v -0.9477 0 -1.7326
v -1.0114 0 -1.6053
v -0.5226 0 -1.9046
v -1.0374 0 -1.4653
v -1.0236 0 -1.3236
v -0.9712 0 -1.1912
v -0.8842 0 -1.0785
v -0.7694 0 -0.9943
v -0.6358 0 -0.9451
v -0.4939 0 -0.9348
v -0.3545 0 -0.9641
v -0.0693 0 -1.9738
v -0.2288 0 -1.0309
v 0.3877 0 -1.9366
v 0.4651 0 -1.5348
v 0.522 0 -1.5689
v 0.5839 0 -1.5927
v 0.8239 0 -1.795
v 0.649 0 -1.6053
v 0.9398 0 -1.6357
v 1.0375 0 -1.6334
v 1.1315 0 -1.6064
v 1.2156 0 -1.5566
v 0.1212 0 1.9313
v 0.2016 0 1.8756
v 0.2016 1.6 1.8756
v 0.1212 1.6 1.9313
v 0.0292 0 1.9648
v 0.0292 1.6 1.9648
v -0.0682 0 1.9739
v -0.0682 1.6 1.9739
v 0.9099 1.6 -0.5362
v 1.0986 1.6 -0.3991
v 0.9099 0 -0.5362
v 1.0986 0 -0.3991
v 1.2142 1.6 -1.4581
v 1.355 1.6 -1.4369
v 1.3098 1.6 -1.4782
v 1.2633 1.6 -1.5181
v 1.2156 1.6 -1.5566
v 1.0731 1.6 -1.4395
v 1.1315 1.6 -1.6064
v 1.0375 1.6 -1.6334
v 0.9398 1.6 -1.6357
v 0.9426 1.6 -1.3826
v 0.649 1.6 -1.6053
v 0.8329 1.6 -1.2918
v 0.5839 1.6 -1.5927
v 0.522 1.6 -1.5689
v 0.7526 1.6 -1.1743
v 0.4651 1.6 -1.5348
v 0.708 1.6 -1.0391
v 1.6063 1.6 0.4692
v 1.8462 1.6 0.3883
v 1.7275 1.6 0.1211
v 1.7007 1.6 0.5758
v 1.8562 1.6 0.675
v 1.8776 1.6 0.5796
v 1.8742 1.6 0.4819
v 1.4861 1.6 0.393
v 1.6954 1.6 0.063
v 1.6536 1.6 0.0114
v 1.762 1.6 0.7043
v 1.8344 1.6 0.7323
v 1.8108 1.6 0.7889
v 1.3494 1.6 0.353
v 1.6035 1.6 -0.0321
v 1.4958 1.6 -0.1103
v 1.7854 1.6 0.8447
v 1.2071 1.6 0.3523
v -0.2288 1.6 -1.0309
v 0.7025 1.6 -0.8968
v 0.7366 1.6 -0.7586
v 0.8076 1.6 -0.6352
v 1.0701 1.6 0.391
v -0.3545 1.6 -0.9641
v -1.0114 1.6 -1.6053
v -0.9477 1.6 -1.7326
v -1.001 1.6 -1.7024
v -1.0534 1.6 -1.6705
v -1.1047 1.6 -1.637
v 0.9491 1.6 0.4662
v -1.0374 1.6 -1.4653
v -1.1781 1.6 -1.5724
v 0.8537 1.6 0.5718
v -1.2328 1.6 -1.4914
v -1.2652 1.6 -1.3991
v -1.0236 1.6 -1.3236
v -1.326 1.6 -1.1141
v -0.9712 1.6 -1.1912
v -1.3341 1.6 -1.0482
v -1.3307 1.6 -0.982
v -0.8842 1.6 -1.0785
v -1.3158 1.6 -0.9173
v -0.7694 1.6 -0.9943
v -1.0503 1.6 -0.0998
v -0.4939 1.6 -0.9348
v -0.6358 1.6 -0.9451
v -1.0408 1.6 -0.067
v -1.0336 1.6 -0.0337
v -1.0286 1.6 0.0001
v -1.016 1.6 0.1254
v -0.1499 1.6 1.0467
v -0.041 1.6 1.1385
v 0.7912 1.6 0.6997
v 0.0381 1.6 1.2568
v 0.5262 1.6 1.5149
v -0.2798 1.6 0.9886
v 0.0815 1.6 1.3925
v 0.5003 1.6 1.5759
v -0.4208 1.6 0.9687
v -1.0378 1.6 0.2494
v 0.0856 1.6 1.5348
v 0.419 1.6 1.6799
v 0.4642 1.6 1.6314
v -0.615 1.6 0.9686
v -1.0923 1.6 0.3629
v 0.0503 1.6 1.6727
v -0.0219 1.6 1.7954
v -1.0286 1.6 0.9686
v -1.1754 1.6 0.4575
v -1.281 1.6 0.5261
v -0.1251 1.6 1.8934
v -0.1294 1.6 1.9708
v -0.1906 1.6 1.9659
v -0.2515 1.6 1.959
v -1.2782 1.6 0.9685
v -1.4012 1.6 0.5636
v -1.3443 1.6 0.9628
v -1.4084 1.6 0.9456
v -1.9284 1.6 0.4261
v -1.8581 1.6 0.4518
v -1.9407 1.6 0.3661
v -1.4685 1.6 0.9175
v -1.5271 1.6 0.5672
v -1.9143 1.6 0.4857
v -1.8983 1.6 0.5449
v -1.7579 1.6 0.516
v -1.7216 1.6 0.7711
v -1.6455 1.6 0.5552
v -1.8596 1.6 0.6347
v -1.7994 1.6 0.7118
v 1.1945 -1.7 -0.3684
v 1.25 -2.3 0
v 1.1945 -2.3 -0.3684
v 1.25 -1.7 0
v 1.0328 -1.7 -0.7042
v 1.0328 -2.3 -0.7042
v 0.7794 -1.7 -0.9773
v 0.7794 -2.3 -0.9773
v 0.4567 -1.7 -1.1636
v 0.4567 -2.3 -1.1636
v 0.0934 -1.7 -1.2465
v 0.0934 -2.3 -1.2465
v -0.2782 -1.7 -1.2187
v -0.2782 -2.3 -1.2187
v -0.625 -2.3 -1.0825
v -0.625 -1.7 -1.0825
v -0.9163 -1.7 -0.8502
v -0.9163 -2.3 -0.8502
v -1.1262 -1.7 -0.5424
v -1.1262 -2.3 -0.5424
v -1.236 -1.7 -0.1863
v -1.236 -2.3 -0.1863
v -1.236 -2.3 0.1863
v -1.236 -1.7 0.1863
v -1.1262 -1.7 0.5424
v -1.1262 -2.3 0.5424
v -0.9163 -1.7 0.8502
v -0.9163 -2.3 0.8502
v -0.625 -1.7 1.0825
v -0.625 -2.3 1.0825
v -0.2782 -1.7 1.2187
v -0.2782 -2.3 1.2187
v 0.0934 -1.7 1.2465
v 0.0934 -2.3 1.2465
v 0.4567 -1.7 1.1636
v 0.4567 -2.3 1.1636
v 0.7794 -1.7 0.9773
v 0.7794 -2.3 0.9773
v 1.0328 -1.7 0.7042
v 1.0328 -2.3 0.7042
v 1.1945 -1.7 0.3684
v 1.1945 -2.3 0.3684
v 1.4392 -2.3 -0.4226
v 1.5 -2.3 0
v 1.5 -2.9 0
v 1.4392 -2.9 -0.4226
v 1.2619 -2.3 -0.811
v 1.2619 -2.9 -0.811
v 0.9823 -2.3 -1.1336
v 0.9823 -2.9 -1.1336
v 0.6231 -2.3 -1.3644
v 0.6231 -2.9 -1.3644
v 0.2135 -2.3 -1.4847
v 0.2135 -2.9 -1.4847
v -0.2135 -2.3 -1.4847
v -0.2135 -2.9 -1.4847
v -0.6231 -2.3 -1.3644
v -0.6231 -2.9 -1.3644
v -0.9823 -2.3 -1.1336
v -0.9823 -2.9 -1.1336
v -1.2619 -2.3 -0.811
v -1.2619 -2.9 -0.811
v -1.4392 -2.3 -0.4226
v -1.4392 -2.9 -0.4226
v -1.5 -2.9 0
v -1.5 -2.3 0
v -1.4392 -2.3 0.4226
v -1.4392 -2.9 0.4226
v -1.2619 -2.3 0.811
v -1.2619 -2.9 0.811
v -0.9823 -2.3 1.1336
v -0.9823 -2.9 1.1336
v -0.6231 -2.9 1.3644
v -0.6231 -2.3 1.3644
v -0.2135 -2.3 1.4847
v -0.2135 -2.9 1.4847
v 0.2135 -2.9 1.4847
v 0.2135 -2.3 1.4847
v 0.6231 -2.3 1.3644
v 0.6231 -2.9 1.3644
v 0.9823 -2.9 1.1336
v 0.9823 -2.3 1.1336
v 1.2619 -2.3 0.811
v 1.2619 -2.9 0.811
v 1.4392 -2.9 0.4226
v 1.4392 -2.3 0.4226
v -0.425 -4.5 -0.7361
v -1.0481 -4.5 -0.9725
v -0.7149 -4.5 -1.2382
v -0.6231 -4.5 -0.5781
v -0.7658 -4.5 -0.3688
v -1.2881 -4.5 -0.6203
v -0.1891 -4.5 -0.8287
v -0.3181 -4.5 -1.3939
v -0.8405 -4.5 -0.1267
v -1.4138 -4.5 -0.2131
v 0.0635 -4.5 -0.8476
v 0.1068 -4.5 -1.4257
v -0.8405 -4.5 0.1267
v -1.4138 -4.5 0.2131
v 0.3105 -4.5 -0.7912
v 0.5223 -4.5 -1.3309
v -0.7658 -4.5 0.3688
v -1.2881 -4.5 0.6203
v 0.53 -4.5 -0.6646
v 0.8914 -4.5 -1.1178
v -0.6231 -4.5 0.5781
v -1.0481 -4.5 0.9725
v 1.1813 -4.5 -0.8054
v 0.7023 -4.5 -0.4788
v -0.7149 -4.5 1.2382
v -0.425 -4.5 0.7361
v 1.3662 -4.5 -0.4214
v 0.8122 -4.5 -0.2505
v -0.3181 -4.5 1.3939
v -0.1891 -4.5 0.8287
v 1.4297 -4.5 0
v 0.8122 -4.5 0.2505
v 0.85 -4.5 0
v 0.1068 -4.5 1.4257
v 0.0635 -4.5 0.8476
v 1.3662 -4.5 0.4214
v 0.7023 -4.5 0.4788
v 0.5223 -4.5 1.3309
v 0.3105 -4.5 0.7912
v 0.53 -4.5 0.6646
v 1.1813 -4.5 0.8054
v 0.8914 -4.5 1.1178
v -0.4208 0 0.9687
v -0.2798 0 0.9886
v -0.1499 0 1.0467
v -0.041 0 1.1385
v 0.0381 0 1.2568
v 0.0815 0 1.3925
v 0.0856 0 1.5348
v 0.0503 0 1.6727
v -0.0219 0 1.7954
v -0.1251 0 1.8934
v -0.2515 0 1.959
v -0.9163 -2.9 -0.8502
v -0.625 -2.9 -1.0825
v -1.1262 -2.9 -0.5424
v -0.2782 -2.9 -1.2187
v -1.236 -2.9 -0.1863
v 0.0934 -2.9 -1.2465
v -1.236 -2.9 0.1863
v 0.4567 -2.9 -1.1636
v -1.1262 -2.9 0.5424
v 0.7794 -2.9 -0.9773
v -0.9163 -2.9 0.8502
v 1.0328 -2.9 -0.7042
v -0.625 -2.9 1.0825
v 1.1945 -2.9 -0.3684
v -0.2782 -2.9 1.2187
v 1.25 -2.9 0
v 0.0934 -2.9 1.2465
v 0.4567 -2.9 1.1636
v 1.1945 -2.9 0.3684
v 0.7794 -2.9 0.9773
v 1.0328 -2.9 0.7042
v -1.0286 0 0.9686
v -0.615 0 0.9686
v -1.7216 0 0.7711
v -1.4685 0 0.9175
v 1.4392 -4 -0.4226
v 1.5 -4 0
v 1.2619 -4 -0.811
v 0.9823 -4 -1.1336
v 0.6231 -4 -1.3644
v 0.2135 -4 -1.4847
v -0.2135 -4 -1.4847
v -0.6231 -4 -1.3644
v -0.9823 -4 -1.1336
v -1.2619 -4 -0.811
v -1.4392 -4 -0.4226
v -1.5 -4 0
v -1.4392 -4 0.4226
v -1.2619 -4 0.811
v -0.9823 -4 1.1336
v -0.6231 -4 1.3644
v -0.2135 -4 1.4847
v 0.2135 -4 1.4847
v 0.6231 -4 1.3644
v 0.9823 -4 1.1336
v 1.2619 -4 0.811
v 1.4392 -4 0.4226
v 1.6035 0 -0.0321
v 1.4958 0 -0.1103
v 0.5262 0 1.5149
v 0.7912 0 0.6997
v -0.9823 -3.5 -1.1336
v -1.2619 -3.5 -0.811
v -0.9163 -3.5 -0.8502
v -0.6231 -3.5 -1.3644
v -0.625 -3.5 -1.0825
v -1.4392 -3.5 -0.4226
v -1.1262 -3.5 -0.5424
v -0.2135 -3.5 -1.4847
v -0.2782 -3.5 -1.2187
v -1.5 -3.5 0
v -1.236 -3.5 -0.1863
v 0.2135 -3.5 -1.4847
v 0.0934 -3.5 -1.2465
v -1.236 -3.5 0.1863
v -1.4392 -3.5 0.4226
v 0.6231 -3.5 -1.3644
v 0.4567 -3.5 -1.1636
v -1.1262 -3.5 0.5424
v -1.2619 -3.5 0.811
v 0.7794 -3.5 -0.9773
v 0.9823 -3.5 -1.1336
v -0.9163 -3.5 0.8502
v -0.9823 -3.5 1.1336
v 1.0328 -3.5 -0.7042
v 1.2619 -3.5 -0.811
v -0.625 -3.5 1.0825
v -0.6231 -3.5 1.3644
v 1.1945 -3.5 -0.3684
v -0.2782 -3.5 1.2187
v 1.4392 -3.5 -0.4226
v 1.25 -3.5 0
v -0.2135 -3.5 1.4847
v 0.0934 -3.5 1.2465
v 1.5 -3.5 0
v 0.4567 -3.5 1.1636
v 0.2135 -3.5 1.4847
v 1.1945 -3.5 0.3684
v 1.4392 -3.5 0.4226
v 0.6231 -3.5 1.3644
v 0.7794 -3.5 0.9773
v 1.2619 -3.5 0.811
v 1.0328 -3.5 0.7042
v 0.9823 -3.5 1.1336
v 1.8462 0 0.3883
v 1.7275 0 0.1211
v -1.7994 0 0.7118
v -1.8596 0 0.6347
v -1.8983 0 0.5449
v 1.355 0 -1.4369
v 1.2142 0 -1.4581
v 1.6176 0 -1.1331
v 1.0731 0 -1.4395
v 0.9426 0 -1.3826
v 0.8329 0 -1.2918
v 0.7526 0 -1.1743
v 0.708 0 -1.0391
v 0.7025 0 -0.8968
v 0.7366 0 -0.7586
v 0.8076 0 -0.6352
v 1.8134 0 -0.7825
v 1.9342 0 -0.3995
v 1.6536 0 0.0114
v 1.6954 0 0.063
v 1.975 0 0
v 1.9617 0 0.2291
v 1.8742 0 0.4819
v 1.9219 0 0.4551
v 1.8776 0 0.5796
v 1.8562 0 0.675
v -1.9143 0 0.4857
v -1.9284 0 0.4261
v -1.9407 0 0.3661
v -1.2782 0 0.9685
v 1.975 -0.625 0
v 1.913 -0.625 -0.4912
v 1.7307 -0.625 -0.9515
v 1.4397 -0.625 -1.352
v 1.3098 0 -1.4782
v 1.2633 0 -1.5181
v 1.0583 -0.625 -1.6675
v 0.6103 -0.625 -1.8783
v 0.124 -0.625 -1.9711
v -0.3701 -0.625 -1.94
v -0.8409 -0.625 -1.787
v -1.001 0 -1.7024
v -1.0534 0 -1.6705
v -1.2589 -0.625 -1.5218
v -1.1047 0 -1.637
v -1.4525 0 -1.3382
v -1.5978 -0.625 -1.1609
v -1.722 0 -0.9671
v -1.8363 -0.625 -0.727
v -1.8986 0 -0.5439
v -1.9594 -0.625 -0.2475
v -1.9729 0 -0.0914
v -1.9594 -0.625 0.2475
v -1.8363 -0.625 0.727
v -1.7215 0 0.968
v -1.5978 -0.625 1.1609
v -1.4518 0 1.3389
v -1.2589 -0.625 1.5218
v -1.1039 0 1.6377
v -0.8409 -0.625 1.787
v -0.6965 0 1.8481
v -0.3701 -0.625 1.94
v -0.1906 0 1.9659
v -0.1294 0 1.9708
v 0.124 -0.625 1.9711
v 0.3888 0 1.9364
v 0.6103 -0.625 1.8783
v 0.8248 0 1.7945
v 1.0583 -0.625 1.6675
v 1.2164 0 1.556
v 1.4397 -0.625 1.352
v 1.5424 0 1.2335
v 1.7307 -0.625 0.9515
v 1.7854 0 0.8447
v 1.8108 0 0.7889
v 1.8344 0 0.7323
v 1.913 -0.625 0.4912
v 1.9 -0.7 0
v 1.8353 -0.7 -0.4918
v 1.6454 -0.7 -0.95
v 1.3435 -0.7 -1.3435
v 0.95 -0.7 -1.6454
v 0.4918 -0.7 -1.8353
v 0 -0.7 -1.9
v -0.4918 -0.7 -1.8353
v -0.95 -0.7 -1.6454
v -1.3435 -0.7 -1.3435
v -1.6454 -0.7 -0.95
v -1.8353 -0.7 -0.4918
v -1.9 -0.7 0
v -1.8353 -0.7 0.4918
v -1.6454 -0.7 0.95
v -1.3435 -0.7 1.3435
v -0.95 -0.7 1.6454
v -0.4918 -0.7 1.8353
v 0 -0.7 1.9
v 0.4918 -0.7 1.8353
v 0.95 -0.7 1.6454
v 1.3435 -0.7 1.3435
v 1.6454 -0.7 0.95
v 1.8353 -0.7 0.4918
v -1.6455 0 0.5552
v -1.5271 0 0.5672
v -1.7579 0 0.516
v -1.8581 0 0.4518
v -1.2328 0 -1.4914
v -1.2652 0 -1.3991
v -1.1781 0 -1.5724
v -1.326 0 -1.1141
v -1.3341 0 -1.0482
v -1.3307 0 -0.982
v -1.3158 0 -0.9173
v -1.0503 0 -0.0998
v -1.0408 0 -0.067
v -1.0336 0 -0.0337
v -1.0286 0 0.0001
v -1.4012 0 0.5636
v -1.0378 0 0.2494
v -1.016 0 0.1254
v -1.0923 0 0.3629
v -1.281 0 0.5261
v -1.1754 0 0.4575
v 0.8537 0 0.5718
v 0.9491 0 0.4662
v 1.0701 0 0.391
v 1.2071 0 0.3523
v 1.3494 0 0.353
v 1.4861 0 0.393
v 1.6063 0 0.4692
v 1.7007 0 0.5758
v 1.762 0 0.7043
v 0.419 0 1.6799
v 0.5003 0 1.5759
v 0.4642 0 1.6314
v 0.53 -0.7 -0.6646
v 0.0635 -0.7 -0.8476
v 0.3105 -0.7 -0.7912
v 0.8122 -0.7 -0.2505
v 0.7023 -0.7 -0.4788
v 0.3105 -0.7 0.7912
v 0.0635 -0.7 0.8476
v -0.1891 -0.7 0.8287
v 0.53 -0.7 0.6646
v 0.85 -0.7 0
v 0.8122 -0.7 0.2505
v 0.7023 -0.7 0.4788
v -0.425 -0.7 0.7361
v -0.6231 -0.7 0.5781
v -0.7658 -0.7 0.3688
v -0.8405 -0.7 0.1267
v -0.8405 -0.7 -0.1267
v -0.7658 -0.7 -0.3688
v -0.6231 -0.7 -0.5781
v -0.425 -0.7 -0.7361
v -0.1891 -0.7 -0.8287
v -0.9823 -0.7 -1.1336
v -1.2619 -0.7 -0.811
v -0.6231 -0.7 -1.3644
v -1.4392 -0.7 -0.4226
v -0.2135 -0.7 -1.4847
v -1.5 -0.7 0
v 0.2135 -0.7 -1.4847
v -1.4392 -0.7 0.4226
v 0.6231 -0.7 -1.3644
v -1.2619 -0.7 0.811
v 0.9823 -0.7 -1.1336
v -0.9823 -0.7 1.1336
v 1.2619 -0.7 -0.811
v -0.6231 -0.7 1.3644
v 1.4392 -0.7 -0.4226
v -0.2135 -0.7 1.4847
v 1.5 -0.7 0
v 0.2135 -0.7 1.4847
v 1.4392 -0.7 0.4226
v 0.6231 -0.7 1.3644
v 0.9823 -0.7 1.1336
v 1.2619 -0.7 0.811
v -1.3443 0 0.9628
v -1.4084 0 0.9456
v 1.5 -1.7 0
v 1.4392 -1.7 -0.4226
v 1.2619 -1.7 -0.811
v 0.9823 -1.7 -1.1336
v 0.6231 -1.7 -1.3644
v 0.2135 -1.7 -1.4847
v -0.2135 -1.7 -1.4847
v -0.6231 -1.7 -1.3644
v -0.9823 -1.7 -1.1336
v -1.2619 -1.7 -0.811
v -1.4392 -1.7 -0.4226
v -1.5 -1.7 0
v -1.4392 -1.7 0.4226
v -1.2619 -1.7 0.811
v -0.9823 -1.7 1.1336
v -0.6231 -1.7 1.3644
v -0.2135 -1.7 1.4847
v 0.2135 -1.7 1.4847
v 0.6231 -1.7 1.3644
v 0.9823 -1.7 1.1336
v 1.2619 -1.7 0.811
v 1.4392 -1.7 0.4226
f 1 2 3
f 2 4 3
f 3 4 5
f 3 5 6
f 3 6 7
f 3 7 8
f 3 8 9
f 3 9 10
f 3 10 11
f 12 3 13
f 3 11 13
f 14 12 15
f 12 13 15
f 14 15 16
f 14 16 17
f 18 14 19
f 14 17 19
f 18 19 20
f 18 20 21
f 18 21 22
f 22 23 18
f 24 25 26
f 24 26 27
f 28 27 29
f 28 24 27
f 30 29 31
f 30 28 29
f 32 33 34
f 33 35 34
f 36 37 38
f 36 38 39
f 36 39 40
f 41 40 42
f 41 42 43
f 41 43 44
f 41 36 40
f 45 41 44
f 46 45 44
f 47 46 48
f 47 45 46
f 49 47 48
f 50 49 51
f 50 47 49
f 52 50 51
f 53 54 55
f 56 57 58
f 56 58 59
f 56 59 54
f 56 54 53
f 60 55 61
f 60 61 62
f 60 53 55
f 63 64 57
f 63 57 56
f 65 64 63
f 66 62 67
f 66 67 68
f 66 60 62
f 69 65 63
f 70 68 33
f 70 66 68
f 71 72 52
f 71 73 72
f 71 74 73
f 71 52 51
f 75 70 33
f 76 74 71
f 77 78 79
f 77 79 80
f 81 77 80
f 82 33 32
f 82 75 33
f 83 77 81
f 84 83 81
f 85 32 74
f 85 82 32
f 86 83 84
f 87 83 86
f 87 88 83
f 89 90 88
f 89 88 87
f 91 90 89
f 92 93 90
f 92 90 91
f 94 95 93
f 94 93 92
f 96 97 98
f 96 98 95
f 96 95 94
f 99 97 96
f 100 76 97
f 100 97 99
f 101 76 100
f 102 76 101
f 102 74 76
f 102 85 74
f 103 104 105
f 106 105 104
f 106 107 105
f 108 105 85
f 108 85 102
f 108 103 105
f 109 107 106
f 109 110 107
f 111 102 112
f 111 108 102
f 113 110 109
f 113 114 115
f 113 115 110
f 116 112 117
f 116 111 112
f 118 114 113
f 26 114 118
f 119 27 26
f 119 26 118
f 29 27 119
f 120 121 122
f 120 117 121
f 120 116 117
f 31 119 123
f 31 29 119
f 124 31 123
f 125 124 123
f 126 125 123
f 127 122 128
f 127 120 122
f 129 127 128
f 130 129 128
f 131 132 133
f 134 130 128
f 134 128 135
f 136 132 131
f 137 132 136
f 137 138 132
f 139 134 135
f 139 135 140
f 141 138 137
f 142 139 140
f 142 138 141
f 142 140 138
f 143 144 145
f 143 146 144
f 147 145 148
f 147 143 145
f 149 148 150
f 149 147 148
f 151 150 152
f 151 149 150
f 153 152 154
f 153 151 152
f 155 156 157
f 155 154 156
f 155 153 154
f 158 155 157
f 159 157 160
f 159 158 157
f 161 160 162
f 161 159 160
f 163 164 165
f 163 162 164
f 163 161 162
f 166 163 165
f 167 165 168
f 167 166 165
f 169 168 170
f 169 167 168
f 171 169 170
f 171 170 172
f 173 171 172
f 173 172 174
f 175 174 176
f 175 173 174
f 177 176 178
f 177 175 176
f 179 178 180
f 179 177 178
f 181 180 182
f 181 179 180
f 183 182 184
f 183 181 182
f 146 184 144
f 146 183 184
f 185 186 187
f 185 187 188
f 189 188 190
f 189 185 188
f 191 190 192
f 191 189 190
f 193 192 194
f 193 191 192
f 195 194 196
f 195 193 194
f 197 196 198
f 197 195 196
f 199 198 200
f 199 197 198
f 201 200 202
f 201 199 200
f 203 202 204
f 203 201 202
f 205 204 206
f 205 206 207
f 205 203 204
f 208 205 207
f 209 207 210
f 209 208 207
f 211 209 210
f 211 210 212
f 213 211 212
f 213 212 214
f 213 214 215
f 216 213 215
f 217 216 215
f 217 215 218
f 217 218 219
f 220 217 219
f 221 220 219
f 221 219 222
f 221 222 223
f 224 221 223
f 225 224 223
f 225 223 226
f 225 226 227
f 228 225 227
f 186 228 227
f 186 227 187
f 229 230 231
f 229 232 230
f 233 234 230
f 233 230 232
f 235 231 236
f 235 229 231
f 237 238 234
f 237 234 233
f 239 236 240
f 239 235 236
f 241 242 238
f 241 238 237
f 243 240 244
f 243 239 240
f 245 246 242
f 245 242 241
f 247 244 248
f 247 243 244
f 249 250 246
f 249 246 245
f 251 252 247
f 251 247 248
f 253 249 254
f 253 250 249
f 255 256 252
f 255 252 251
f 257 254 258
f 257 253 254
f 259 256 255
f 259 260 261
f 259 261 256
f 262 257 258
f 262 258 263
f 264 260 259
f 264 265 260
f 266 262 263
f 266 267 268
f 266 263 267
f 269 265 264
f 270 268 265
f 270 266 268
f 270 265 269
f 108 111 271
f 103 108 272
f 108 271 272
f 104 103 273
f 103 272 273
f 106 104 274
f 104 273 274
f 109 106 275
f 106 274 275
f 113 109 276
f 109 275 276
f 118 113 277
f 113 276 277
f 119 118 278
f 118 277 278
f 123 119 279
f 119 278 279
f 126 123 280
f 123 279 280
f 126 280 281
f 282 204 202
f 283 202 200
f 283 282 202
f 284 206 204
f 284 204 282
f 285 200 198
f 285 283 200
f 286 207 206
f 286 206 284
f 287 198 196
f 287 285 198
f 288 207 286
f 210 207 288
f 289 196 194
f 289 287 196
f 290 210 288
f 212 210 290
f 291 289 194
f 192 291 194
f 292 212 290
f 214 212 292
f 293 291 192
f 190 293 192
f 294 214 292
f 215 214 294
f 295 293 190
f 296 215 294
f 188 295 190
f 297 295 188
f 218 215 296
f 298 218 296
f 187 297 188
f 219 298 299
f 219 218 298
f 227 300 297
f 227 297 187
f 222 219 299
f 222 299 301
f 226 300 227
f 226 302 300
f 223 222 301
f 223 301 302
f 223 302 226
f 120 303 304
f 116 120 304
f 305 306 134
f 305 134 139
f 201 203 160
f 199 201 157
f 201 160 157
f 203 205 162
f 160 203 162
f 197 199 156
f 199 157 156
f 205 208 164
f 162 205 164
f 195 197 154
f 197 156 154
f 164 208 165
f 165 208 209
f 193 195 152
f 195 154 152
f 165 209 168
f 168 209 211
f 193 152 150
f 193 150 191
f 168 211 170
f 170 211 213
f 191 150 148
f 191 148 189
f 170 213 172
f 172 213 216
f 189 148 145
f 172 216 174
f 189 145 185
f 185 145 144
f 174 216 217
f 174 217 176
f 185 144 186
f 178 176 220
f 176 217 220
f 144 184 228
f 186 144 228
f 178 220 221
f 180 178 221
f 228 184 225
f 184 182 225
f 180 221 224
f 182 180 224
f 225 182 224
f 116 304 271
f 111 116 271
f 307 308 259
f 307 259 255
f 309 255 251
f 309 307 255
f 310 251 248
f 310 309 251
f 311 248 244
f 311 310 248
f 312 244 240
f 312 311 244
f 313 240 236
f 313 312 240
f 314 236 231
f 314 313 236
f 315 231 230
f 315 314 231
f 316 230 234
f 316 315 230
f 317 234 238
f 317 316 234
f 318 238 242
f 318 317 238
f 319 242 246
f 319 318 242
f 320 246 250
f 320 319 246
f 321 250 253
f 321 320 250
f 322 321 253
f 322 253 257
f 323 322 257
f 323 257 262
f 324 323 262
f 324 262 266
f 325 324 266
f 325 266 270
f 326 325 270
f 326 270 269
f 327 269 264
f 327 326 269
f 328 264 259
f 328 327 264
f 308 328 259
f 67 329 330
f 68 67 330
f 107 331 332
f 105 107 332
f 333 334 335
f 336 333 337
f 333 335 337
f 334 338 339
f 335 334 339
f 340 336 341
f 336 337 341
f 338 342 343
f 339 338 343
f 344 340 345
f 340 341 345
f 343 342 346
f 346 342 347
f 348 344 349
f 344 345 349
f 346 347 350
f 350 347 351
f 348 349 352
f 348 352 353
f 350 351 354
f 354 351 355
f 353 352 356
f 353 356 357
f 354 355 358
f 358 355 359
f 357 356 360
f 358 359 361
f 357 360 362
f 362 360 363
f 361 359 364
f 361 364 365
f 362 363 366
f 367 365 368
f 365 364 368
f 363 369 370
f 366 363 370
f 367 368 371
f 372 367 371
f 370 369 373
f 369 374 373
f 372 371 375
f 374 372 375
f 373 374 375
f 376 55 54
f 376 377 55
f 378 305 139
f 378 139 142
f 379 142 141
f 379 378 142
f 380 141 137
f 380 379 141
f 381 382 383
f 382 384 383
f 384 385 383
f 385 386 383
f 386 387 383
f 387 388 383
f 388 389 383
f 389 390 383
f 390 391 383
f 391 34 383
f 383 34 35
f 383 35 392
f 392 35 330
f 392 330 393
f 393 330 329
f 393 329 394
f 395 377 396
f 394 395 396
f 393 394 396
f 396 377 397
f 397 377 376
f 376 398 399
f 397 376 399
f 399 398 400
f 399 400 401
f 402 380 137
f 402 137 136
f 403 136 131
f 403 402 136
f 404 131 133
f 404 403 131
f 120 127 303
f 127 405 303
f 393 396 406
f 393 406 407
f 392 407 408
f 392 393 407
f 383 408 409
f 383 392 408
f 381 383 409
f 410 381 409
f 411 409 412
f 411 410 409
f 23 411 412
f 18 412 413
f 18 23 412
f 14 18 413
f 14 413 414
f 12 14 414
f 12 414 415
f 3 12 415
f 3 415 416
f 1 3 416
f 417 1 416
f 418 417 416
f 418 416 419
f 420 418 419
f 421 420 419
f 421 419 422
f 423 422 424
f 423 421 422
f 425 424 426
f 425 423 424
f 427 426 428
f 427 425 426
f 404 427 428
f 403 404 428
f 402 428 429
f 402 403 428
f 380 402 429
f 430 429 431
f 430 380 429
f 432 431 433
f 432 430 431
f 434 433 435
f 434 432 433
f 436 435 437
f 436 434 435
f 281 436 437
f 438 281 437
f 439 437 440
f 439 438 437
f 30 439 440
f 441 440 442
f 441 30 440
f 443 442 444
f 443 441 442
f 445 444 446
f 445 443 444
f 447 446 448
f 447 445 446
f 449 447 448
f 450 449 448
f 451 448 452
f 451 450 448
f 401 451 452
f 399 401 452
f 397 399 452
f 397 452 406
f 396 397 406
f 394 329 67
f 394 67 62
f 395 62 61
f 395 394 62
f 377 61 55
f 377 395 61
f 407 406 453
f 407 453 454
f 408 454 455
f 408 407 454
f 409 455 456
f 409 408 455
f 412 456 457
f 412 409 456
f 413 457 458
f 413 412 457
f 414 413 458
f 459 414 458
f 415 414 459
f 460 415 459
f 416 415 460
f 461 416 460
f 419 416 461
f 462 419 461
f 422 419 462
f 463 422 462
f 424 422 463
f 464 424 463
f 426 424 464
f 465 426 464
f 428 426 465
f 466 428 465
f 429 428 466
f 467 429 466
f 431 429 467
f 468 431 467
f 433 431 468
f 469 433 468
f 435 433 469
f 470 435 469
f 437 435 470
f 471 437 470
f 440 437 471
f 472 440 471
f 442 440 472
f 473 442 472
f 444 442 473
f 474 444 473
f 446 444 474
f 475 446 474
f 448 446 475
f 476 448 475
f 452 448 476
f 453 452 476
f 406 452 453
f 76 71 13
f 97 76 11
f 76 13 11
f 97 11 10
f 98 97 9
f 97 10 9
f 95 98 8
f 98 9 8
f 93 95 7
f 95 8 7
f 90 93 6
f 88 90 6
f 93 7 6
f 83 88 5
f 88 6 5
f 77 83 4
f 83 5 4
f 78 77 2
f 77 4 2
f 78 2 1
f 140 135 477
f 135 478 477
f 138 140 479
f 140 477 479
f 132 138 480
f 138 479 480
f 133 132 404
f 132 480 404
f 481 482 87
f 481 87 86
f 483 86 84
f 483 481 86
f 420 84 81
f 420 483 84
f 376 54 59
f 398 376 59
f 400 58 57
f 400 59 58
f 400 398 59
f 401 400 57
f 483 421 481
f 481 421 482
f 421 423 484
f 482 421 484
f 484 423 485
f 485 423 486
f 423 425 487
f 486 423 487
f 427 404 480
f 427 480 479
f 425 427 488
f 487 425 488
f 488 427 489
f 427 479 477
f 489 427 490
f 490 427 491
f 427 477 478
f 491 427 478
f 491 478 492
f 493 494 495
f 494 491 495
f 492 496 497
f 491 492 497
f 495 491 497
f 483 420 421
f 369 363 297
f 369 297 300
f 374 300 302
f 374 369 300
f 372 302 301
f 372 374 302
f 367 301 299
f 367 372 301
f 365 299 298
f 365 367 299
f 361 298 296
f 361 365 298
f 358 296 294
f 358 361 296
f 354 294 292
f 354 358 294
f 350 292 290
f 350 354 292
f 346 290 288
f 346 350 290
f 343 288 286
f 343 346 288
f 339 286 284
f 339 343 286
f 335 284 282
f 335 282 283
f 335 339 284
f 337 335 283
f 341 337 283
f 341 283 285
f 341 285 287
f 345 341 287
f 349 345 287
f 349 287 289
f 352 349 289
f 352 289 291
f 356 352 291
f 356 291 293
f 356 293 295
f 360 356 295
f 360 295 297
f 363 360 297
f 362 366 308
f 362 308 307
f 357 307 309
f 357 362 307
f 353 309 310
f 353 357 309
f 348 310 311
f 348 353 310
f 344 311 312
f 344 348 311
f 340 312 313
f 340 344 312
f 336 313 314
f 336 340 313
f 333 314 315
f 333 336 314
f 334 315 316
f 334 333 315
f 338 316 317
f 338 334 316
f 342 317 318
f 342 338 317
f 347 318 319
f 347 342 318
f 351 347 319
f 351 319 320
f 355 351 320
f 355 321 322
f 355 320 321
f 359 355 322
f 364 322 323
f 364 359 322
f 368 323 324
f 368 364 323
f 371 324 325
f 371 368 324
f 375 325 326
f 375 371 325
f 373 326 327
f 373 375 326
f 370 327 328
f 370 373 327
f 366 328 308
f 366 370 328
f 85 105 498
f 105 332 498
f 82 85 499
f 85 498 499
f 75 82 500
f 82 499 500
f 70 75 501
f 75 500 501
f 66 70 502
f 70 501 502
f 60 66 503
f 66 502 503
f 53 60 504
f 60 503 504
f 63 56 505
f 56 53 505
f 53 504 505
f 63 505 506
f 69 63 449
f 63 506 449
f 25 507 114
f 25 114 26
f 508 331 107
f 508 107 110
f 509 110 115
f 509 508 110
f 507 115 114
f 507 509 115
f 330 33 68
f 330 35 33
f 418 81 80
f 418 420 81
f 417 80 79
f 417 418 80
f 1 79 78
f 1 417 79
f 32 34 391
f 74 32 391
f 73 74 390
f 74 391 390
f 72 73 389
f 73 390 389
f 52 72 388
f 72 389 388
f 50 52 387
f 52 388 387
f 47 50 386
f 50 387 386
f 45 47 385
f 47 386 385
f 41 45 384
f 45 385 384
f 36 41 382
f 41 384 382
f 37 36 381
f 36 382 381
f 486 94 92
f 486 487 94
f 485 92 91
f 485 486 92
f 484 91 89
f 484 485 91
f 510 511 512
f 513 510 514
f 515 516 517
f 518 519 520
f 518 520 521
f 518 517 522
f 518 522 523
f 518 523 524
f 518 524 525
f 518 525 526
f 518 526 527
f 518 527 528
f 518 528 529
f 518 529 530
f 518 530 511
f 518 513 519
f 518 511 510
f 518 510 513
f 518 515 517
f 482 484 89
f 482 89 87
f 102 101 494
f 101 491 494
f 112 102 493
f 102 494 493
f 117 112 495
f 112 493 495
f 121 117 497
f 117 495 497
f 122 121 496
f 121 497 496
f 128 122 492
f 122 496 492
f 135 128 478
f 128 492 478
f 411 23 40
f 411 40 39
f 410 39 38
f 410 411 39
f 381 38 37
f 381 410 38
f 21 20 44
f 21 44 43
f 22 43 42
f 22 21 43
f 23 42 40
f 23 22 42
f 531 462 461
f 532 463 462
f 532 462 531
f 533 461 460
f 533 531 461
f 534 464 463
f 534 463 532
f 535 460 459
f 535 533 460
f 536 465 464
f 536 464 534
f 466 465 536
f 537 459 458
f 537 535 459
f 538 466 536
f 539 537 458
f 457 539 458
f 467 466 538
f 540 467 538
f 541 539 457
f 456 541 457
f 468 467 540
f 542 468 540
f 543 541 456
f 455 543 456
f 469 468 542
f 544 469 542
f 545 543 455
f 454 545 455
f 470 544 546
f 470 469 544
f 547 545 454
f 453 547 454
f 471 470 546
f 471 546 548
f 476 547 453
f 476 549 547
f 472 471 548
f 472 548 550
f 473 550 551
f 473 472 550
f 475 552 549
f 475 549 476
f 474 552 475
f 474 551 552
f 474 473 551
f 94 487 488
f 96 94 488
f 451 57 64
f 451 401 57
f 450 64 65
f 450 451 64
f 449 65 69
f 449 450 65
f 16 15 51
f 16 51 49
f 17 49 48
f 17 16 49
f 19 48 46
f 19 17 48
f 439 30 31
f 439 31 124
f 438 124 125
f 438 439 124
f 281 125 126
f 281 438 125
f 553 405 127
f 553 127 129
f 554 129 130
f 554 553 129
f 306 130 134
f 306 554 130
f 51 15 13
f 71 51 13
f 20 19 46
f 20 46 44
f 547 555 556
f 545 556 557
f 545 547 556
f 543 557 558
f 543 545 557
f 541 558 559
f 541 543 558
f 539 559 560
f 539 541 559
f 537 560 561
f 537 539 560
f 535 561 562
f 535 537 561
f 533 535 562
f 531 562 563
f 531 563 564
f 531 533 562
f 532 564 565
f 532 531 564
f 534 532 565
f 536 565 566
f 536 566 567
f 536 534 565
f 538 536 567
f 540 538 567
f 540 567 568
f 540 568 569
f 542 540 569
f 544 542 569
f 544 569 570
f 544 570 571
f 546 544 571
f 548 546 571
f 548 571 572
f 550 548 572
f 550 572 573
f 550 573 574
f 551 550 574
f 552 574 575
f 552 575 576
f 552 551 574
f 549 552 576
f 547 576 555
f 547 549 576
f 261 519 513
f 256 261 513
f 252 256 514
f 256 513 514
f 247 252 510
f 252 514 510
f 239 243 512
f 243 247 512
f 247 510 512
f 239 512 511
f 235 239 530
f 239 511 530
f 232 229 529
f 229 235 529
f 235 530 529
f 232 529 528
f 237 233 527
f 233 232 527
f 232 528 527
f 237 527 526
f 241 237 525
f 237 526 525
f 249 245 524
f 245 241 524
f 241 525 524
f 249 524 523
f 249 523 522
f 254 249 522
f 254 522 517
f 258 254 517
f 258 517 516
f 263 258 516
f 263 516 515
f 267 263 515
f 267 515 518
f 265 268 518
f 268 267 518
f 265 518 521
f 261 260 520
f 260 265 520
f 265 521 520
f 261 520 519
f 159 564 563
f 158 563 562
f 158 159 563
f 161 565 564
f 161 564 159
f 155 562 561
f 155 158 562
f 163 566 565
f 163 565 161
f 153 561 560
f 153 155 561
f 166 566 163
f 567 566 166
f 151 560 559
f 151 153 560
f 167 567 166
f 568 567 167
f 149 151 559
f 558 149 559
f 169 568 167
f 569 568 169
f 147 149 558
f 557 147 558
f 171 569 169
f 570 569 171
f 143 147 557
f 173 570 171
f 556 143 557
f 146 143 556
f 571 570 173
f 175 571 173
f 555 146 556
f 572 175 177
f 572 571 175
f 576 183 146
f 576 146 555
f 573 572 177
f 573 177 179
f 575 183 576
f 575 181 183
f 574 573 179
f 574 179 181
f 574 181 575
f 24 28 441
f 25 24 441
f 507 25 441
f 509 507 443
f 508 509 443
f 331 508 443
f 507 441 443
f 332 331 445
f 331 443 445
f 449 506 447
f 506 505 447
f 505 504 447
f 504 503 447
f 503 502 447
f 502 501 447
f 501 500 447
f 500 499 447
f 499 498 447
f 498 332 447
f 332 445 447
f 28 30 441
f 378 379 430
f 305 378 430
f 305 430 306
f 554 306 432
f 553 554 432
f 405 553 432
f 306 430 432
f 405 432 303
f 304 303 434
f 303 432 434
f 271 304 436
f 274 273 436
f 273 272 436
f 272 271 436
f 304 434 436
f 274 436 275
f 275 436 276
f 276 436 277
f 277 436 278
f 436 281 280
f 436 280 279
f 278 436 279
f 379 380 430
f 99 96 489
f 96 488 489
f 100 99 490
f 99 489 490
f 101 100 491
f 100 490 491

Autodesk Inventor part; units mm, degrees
ref_plane "YZ Plane" through (0, 0, 0) normal (1, 0, 0) x (0, 1, 0)
sketch "Sketch1" plane through (0, 0, 0) normal (0, 1, 0) x (-1, 0, 0)
  line L0 (-0.649, -1.6053) -> (-0.9398, -1.6357)
  line L1 (-0.419, 1.6799) -> (-0.2016, 1.8756)
  line L2 (-0.419, 1.6799) -> (-0.2016, 1.8756)
  arc A0 (0.9477, -1.7326) -> (0.2288, -1.0309) centre (0.5282, -1.4432) ccw
  line L3 (-0.4651, -1.5348) -> (0.2288, -1.0309)
  arc A1 (-1.355, -1.4369) -> (-1.2156, -1.5566) centre (-0.0001, 0.0001) ccw
  line L4 (-0.4651, -1.5348) -> (0.2288, -1.0309)
  arc A2 (-0.649, -1.6053) -> (-0.4651, -1.5348) centre (-0.6886, -1.227) ccw
  arc A3 (0.2515, 1.959) -> (0.4208, 0.9687) centre (0.4209, 1.4783) ccw
  line L5 (1.2782, 0.9685) -> (0.4208, 0.9687)
  arc A4 (1.4685, 0.9175) -> (1.2782, 0.9685) centre (1.2781, 0.5882) ccw
  line L6 (1.4685, 0.9175) -> (1.7216, 0.7711)
  arc A5 (1.9407, 0.3661) -> (1.0503, -0.0998) centre (1.535, 0.0576) ccw
  line L7 (1.3158, -0.9173) -> (1.0503, -0.0998)
  arc A6 (1.326, -1.1141) -> (1.3158, -0.9173) centre (0.954, -1.0348) ccw
  line L8 (1.326, -1.1141) -> (1.2652, -1.3991)
  arc A7 (-1.7854, 0.8447) -> (-0.7912, 0.6997) centre (-1.2759, 0.8573) ccw
  line L9 (-0.5262, 1.5149) -> (-0.7912, 0.6997)
  arc A8 (-0.419, 1.6799) -> (-0.5262, 1.5149) centre (-0.1645, 1.3973) ccw
  line L10 (-1.7275, 0.1211) -> (-1.8462, 0.3883)
  arc A9 (-1.7275, 0.1211) -> (-1.6035, -0.0321) centre (-1.3799, 0.2756) ccw
  line L11 (-1.6035, -0.0321) -> (-0.9099, -0.5362)
  arc A10 (-1.355, -1.4369) -> (-0.9099, -0.5362) centre (-1.2095, -0.9485) ccw
  arc A11 (1.9407, 0.366) -> (1.8983, 0.5449) centre (-0.0001, 0.0001) ccw
  arc A12 (-1.7854, 0.8447) -> (-1.8562, 0.675) centre (-0.0001, 0.0001) ccw
  arc A13 (0.9477, -1.7326) -> (1.1047, -1.637) centre (-0.0001, 0.0001) ccw
  arc A14 (0.2515, 1.959) -> (0.0682, 1.9739) centre (-0.0001, 0.0001) ccw
  arc A15 (0.0682, 1.9739) -> (-0.2016, 1.8756) centre (0.0549, 1.5907) ccw
  arc A16 (-1.8562, 0.675) -> (-1.8462, 0.3883) centre (-1.4958, 0.544) ccw
  arc A17 (1.8983, 0.5449) -> (1.7216, 0.7711) centre (1.5297, 0.4392) ccw
  arc A18 (-1.2156, -1.5566) -> (-0.9398, -1.6357) centre (-0.9797, -1.2544) ccw
  arc A19 (1.1047, -1.637) -> (1.2652, -1.3991) centre (0.8902, -1.3192) ccw
  circle A20 centre (-0.0001, 0.0001) radius 1.975
  arc A21 (1.5271, 0.5672) -> (1.0286, 0.0001) centre (1.4772, 0.1085) ccw
  line L12 (1.7216, 0.7711) -> (1.4685, 0.9175)
  line L13 (1.0286, 0.9686) -> (0.615, 0.9686)
  arc A22 (-1.5257, 0.4131) -> (-0.7912, 0.6997) centre (-1.2759, 0.8573) ccw
  arc A23 (-0.0001, 1.1912) -> (0.4206, 0.9684) centre (0.3627, 1.3676) ccw
  line L14 (-0.419, 1.6799) -> (-0.2016, 1.8756)
  arc A24 (-0.7912, 0.6997) -> (-0.7912, 0.6997) centre (-1.0986, 0.7997) ccw
  line L15 (1.326, -1.1141) -> (1.2652, -1.3991)
  arc A25 (0.7729, -0.9962) -> (0.2288, -1.0309) centre (0.5282, -1.4432) ccw
  arc A26 (-0.9715, -1.3991) -> (-0.9099, -0.5362) centre (-1.2095, -0.9485) ccw
  line L16 (-1.0986, -0.3991) -> (-1.4958, -0.1103)
  line L17 (-0.649, -1.6053) -> (-0.9099, -1.6326)
  arc A27 (-1.7278, 0.1218) -> (-1.8462, 0.3883) centre (-12657.1556, -5624.5961) ccw
  arc A28 (1.9228, 0.3883) -> (1.5271, 0.5672) centre (1.535, 0.0576) ccw
  arc A29 (0.9477, -1.7326) -> (0.7509, -0.9848) centre (0.5282, -1.4432) ccw
  arc A30 (-1.3317, -1.4432) -> (-0.9715, -1.3991) centre (-1.2095, -0.9485) ccw
  arc A31 (0.2515, 1.959) -> (-0.0001, 1.1912) centre (0.603, 1.4187) ccw
  arc A32 (-1.7854, 0.8447) -> (-1.5257, 0.4131) centre (-1.2759, 0.8573) ccw
  point P0 (0, 0)
  point P1 (1.2784, 0.9684)
  point P2 (1.1047, -1.637)
  point P3 (1.9407, 0.3661)
  point P4 (1.8983, 0.5449)
  point P5 (0.0682, 1.9739)
  point P6 (-1.7854, 0.8447)
  point P7 (-1.8562, 0.675)
  point P8 (-1.355, -1.4369)
  point P9 (-1.2156, -1.5566)
  dimension "d0" = 3.95
extrude "Extrusion1" add sketch "Sketch1" along normal blind 1.6 contours L0 A18 A1 A10 L11 A9 L10 A16 A12 A7 L9 A8 L1 A15 A14 A3 A23 L5 A4 L6 A17 A11 A5 A21 L7 A6 L8 A19 A13 A0 L3 A2 | A3 A23
sketch "Sketch2" plane through (0, 0, 0) normal (0, -1, 0) x (1, 0, 0)
  circle A0 centre (0, 0) radius 1.975
  dimension "d3" = 3.95
extrude "Extrusion2" add sketch "Sketch2" along normal blind 0.7
sketch "Sketch3" plane through (0, -0.7, 0) normal (0, -1, 0) x (1, 0, 0)
  circle A0 centre (0, 0) radius 1.5
  circle A1 centre (0, 0) radius 0.85
  dimension "d6" = 3
  dimension "d7" = 1.7
extrude "Extrusion3" add sketch "Sketch3" along normal blind 3.8
chamfer "Chamfer1" distance 0.5 angle 8 1 edges at (-1.5, -4.5, 0) measured on face at (1.4951, -3.2333, -0.1207)
ref_plane "Work Plane1" through (0, -3.5, 0) normal (0, -1, 0) x (1, 0, 0)
sketch "Sketch6" plane through (0, -3.5, 0) normal (0, -1, 0) x (1, 0, 0)
  circle A0 centre (0, 0) radius 1.25
  circle A1 centre (0, 0) radius 1.8158
  circle A2 centre (0, 0) radius 1.5 projected
  dimension "d22" = 0.25
extrude "Extrusion5" cut sketch "Sketch6" against normal blind 0.6 contours A1 | A2
ref_plane "Work Plane2" through (0, -2, 0) normal (0, -1, 0) x (1, 0, 0)
sketch "Sketch12" plane through (0, -2, 0) normal (0, -1, 0) x (1, 0, 0)
  circle A0 centre (0, 0) radius 1.25
  circle A1 centre (0, 0) radius 1.5 projected
  circle A2 centre (0, 0) radius 1.6718
  dimension "d32" = 0.25
extrude "Extrusion8" cut sketch "Sketch12" against normal mid plane 0.6 contours A1 | A2
chamfer "Chanfrein3" distance 0.075 angle 45 1 edges at (-1.975, -0.7, 0)
properties part number "4mm_uncorrected"
